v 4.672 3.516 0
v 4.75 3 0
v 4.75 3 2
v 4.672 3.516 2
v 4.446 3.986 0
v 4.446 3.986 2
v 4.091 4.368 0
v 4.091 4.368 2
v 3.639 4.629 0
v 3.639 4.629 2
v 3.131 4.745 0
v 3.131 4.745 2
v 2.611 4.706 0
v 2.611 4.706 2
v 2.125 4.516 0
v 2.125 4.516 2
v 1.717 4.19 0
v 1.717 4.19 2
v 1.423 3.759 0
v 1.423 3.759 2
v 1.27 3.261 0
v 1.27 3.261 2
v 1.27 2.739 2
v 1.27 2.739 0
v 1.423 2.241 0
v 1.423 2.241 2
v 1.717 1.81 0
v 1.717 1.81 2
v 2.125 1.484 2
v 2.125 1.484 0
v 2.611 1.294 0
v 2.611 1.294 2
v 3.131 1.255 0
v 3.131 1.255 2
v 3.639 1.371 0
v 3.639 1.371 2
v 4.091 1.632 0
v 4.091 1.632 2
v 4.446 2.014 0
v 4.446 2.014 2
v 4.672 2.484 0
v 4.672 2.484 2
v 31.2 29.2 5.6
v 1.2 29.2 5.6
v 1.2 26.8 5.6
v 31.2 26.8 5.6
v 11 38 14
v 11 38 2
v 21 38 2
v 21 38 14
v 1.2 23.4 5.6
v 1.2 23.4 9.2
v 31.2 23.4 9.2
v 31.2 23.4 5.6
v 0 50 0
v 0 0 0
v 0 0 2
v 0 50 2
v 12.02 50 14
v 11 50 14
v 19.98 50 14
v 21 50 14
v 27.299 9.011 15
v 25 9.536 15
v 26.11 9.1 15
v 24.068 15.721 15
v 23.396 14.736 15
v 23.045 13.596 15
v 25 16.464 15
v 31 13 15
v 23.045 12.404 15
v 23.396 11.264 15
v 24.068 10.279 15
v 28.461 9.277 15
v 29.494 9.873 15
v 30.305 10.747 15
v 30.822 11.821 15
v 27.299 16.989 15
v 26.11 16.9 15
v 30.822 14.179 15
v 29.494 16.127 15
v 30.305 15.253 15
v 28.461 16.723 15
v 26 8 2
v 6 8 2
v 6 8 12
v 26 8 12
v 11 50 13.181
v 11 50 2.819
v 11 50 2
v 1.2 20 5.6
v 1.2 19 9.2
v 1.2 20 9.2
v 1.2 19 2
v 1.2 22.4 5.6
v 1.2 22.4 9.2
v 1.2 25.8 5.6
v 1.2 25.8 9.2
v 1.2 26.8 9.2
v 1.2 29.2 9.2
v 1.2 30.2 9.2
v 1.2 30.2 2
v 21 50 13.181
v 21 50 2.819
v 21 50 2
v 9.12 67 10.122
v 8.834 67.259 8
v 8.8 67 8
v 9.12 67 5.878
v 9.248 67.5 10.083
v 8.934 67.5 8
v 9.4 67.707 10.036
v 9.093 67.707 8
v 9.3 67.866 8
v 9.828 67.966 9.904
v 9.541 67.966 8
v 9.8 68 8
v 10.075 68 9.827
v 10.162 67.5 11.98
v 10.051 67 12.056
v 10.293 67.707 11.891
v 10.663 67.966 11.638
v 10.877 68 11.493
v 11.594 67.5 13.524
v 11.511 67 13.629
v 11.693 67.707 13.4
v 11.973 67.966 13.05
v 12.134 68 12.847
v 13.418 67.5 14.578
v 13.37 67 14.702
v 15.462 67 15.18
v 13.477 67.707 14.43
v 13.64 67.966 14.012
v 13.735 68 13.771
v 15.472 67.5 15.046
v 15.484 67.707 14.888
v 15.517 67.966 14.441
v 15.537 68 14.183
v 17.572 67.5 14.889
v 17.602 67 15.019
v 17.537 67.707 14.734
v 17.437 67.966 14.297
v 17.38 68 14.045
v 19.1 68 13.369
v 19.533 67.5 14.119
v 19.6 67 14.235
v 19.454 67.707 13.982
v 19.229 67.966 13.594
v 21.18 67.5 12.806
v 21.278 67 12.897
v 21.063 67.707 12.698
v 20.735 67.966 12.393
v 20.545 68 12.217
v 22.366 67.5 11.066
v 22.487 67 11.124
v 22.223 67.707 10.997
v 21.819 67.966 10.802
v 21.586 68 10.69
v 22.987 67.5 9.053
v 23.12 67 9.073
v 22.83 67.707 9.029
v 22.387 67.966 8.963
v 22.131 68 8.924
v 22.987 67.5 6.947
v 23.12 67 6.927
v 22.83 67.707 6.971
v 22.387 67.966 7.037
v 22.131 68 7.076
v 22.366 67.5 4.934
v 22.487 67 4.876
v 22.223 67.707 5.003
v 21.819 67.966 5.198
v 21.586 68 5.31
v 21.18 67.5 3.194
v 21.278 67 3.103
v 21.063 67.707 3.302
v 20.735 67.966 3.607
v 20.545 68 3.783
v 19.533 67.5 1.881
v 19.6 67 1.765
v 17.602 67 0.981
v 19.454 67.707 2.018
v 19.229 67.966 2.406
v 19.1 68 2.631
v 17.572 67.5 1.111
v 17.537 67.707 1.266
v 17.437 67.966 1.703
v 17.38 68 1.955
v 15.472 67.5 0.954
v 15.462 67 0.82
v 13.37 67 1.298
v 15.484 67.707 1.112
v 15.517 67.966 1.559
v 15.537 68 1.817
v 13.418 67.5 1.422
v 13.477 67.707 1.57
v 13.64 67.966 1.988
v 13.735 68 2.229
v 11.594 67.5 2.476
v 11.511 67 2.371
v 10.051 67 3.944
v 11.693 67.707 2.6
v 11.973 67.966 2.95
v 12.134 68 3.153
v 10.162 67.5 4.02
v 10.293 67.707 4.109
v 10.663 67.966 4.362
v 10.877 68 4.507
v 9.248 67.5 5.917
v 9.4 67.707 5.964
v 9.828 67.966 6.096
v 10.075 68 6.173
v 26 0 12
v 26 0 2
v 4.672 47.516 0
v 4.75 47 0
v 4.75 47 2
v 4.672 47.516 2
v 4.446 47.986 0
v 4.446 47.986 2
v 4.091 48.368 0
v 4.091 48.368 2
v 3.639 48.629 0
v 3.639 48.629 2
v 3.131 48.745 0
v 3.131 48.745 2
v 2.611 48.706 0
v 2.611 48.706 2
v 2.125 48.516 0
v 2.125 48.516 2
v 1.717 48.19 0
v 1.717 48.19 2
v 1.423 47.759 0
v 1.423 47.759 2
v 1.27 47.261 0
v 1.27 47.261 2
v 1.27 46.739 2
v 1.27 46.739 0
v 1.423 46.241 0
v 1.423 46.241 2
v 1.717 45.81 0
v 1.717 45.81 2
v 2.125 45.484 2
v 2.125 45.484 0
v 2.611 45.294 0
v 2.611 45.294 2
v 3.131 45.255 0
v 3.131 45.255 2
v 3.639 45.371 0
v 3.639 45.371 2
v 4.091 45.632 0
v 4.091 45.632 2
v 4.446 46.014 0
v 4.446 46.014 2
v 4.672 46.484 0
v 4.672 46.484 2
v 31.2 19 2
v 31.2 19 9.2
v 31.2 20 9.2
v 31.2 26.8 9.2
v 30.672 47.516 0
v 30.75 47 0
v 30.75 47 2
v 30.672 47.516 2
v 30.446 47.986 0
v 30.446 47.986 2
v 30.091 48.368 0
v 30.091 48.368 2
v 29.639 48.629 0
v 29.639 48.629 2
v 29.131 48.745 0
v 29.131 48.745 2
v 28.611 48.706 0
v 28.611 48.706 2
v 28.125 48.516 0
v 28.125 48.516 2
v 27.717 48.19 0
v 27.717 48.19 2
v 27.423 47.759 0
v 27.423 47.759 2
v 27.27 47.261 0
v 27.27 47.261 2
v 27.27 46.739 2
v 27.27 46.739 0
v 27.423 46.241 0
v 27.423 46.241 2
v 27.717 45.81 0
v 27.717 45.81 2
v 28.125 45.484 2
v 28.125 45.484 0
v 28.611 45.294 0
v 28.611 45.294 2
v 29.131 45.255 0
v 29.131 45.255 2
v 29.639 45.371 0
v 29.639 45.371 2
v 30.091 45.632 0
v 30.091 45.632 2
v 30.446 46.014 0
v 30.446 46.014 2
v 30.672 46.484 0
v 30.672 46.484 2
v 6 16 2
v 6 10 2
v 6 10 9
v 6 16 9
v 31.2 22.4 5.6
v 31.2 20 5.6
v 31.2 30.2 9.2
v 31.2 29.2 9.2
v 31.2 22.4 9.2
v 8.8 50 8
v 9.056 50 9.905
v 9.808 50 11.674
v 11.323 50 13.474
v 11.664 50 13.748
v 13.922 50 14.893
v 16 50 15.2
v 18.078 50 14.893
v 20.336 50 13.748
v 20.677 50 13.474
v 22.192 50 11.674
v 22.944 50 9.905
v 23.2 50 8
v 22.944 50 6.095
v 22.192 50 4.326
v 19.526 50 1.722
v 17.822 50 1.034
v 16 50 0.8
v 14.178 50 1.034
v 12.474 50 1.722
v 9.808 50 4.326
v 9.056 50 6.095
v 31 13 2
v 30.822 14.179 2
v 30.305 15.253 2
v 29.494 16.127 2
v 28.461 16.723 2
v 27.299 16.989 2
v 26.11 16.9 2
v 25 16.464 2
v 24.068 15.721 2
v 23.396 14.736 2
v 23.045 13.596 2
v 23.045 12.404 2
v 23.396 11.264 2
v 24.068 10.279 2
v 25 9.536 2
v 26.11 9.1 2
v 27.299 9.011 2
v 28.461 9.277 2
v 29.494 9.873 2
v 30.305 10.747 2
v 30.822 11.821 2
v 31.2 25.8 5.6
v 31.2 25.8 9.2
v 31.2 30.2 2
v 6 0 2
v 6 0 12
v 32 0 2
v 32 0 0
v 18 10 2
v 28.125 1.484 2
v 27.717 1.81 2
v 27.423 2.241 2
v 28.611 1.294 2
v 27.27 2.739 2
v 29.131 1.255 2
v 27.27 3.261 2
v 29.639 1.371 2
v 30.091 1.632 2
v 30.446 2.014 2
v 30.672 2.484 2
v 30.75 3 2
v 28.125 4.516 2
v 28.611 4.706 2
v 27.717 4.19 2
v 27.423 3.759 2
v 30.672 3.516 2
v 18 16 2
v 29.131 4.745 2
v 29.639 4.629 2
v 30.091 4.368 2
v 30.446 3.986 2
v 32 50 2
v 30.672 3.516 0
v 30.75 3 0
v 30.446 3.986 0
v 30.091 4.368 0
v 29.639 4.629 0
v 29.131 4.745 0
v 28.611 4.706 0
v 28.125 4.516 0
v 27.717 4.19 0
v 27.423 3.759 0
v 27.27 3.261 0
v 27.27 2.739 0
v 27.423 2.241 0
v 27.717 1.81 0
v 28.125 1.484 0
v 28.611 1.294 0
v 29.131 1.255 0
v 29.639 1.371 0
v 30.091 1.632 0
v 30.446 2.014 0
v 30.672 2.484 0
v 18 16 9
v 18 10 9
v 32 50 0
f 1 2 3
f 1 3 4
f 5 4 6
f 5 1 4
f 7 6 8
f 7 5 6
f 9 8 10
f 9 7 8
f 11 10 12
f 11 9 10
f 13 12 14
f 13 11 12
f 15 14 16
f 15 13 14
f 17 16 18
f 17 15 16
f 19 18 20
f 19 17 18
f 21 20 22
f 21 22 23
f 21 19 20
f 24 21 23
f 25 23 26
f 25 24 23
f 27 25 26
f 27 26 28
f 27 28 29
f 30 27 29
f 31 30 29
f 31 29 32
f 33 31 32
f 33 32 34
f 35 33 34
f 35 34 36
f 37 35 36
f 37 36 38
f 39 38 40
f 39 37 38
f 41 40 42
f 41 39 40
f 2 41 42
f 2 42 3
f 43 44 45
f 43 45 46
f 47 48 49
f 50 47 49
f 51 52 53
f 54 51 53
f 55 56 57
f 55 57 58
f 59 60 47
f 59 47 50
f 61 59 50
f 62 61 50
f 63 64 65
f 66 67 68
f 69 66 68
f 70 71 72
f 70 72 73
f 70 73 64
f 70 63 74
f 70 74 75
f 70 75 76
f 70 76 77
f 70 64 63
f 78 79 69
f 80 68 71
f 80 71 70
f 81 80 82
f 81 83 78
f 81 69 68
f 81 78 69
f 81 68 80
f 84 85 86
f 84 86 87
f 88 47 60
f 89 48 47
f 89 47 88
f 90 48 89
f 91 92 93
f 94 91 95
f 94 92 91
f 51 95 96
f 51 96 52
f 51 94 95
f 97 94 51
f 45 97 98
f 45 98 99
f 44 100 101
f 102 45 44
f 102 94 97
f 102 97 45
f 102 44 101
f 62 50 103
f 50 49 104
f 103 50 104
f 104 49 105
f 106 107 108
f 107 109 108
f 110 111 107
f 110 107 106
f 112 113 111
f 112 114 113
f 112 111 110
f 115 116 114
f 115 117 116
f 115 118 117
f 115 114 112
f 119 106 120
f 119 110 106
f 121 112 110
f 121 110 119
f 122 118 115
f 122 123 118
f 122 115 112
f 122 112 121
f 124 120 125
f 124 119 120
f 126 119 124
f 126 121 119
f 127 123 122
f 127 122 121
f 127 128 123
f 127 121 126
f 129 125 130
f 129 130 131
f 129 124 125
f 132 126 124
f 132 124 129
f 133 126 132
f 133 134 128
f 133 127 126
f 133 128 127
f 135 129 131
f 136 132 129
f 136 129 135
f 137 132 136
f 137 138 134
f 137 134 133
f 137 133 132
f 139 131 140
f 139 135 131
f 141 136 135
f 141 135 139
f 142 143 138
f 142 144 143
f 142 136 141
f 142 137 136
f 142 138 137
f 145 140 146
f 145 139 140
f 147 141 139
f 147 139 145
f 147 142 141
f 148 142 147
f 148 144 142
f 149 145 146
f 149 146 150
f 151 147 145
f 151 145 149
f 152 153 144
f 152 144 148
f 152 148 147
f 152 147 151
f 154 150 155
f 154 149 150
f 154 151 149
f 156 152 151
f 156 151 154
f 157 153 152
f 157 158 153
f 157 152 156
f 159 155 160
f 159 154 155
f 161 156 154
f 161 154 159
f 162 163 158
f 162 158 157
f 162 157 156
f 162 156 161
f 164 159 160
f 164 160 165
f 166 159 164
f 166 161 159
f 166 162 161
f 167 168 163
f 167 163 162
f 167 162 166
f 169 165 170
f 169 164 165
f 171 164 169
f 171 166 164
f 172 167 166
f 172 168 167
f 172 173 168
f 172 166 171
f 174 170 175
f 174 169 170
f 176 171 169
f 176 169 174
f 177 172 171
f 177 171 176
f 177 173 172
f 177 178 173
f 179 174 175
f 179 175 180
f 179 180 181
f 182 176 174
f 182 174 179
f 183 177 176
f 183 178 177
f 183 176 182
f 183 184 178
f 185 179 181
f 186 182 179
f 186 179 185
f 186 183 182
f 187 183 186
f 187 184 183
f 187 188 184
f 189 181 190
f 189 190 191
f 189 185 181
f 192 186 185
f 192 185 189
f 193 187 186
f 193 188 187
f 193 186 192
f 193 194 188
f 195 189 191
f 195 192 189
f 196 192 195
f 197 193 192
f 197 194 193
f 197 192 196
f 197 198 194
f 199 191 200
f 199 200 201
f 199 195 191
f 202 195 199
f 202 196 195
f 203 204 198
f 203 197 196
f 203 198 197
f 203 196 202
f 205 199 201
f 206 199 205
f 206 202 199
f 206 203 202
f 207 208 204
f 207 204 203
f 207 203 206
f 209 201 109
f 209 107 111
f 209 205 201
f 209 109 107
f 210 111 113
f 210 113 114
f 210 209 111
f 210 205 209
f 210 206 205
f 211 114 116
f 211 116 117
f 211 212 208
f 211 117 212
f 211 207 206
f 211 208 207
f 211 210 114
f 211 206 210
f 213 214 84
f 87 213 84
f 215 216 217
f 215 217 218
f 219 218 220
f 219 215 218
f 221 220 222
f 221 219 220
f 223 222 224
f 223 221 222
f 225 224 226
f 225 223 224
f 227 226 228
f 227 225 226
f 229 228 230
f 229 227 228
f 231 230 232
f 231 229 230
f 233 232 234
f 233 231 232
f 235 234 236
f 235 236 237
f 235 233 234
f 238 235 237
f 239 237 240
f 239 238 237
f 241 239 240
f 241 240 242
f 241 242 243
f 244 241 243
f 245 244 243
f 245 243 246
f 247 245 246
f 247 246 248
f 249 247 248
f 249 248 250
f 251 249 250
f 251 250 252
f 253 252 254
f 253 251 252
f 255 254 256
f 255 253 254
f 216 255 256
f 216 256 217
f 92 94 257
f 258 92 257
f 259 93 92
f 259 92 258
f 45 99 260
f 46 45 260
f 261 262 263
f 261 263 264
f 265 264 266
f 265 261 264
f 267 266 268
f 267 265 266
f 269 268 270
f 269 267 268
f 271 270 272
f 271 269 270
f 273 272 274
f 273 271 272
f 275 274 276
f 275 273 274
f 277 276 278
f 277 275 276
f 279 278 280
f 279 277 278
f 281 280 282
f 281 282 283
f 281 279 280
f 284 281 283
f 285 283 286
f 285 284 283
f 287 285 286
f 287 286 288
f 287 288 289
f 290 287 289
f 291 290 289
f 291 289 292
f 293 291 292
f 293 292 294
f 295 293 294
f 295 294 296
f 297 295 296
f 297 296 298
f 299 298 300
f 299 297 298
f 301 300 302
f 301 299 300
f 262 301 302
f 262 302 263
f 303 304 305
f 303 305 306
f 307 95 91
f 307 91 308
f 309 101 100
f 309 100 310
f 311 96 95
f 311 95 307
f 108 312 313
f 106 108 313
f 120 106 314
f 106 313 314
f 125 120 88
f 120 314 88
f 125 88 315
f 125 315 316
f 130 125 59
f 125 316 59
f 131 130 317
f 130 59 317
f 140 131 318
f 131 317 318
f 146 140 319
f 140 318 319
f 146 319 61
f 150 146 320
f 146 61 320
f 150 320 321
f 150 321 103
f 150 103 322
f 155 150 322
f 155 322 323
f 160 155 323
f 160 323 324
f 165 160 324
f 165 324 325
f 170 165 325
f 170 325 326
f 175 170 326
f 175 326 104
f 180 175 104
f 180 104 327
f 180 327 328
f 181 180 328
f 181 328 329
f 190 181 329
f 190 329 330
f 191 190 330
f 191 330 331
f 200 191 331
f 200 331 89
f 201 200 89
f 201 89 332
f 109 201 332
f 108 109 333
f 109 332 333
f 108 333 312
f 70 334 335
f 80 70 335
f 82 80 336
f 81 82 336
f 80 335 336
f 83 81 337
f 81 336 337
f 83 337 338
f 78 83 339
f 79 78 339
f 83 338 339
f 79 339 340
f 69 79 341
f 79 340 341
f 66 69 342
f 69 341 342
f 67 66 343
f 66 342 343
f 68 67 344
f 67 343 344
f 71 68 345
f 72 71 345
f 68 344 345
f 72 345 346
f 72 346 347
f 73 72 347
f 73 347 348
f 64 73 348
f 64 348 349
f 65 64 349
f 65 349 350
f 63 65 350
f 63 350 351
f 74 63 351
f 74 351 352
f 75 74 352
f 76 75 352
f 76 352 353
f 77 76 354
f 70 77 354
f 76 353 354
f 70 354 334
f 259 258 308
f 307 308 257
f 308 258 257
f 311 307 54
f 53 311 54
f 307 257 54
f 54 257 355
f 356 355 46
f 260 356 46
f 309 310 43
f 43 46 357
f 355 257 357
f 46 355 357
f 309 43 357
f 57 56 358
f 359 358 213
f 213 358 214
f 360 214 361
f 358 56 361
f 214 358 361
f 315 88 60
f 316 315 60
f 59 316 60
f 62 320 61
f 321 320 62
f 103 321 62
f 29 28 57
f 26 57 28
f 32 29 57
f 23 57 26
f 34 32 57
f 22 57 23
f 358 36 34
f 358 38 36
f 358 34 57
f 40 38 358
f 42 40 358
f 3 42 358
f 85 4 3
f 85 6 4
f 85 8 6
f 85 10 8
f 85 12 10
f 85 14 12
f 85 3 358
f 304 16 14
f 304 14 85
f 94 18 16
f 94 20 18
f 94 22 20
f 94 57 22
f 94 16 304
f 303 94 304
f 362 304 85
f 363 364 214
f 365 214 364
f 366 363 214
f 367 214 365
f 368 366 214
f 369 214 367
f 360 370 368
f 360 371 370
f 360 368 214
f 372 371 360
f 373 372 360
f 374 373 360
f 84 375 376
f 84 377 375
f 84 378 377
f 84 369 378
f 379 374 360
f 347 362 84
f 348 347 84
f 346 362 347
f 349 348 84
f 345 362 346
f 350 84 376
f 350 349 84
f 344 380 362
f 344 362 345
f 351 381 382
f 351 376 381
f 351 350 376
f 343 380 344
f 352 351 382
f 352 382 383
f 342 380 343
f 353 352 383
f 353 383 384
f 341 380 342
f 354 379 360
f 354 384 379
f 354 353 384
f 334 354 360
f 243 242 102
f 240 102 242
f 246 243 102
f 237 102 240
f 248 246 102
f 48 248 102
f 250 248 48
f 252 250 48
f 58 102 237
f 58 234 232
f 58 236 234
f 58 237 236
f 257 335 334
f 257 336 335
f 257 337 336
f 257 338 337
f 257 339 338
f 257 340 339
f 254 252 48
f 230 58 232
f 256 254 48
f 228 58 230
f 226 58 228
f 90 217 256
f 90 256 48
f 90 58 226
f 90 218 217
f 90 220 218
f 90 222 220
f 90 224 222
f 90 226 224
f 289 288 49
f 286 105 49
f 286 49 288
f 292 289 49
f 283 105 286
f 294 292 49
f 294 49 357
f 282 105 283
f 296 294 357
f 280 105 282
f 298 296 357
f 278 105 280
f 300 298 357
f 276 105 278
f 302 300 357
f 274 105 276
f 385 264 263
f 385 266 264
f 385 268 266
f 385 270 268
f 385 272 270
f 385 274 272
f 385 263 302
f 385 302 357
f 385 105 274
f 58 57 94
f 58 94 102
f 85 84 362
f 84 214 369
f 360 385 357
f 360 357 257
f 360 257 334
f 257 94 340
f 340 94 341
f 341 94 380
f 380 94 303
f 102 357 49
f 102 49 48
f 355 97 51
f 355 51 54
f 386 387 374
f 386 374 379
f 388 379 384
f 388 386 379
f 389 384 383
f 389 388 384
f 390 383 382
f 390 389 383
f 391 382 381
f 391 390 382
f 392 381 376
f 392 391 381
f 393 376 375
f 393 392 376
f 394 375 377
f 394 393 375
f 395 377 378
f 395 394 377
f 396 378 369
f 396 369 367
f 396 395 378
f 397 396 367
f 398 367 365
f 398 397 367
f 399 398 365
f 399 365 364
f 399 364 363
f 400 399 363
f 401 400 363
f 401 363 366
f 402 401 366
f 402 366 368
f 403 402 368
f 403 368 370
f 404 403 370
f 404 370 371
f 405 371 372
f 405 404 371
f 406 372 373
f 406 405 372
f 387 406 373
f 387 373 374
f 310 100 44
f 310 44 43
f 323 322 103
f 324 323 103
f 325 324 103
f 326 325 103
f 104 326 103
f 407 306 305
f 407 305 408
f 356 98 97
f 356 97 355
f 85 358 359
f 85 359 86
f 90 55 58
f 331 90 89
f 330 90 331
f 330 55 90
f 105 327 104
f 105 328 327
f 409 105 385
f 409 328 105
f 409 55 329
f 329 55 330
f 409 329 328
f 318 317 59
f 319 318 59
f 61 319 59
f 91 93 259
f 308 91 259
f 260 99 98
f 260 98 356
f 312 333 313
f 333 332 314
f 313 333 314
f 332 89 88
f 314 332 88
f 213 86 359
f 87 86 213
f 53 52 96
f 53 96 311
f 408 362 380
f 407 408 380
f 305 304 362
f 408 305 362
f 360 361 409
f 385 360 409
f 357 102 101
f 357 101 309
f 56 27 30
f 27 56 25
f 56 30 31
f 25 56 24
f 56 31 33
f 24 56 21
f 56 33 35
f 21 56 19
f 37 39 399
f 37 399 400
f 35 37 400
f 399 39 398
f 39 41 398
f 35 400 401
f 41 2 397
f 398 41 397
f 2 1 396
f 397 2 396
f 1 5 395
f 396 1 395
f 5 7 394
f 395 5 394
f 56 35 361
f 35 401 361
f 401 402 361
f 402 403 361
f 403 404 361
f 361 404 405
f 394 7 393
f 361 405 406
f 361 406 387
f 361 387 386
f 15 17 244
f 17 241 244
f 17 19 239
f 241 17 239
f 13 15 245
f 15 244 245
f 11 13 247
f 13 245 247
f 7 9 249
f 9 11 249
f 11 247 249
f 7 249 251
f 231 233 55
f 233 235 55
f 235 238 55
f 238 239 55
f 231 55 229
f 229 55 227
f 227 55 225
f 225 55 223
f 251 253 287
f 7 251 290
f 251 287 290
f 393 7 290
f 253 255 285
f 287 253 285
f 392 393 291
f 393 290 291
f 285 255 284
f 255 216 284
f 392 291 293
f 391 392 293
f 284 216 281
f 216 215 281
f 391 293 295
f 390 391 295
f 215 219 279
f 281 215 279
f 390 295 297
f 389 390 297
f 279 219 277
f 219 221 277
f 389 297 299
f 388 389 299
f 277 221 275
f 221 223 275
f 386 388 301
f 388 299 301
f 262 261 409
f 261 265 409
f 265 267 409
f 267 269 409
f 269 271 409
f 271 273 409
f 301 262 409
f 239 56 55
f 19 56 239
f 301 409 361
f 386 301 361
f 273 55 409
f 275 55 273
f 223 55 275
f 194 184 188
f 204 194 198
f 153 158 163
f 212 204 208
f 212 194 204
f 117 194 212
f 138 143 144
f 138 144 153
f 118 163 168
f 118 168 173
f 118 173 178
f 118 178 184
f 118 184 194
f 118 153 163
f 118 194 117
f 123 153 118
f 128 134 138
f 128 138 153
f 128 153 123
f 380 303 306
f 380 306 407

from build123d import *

# Parameters (mm, degrees)
SKETCH_W     = 32
SKETCH_H     = 50
SKETCH_R     = 1.75
PAD_DEPTH    = 2
SKETCH001_W  = 10
SKETCH001_H  = 12
PAD001_DEPTH = 12
SKETCH002_W  = 20
SKETCH002_H  = 8
PAD002_DEPTH = 10
SKETCH003_R  = 4
PAD003_DEPTH = 13
SKETCH004_W  = 12
SKETCH004_H  = 6
PAD004_DEPTH = 7
SKETCH005_W  = 30
SKETCH005_H  = 11.2
PAD005_DEPTH = 7.2
SKETCH006_W  = 30
SKETCH006_H  = 2.4
POCKET_DEPTH = 3.6
SKETCH007_R  = 7.2
PAD006_DEPTH = 18
FILLET_R     = 1


with BuildPart() as part:
    # Sketch → Pad (new body)
    with BuildSketch(Plane.XY):
        with Locations((16, 25)):
            Rectangle(SKETCH_W, SKETCH_H)
        with Locations((3, 47)):
            Circle(SKETCH_R, mode=Mode.SUBTRACT)
        with Locations((29, 47)):
            Circle(SKETCH_R, mode=Mode.SUBTRACT)
        with Locations((3, 3)):
            Circle(SKETCH_R, mode=Mode.SUBTRACT)
        with Locations((29, 3)):
            Circle(SKETCH_R, mode=Mode.SUBTRACT)
    extrude(amount=PAD_DEPTH)

    # Sketch001 (on Face10 of Pad) → Pad001 (join)
    with BuildSketch(Plane.XY.offset(2)):
        with Locations((16, 44)):
            Rectangle(SKETCH001_W, SKETCH001_H)
    extrude(amount=PAD001_DEPTH)

    # Sketch002 (on Face5 of Pad001) → Pad002 (join)
    with BuildSketch(Plane.XY.offset(2)):
        with Locations((16, 4)):
            Rectangle(SKETCH002_W, SKETCH002_H)
    extrude(amount=PAD002_DEPTH)

    # Sketch003 (on Face5 of Pad002) → Pad003 (join)
    with BuildSketch(Plane.XY.offset(2)):
        with Locations((27, 13)):
            Circle(SKETCH003_R)
    extrude(amount=PAD003_DEPTH)

    # Sketch004 (on Face5 of Pad003) → Pad004 (join)
    with BuildSketch(Plane.XY.offset(2)):
        with Locations((12, 13)):
            Rectangle(SKETCH004_W, SKETCH004_H)
    extrude(amount=PAD004_DEPTH)

    # Sketch005 (on Face5 of Pad004) → Pad005 (join)
    with BuildSketch(Plane.XY.offset(2)):
        with Locations((16.2, 24.6)):
            Rectangle(SKETCH005_W, SKETCH005_H)
    extrude(amount=PAD005_DEPTH)

    # Sketch006 (on Face32 of Pad005) → Pocket (cut)
    with BuildSketch(Plane.XY.offset(9.2)):
        with Locations((16.2, 21.2)):
            Rectangle(SKETCH006_W, SKETCH006_H)
        with Locations((16.2, 24.6)):
            Rectangle(SKETCH006_W, SKETCH006_H)
        with Locations((16.2, 28)):
            Rectangle(SKETCH006_W, SKETCH006_H)
    extrude(amount=-POCKET_DEPTH, mode=Mode.SUBTRACT)

    # Sketch007 (on Face6 of Pocket) → Pad006 (join)
    with BuildSketch(Plane(origin=(0, 50, 0), x_dir=(-1, 0, 0), z_dir=(0, 1, 0))):
        with Locations((-16, 8)):
            Circle(SKETCH007_R)
    extrude(amount=PAD006_DEPTH)

    # Fillet
    fillet_edges = [part.edges().sort_by_distance(p)[0] for p in [
        (23.2, 68, 8),
    ]]
    fillet(fillet_edges, radius=FILLET_R)


solid = part.part
